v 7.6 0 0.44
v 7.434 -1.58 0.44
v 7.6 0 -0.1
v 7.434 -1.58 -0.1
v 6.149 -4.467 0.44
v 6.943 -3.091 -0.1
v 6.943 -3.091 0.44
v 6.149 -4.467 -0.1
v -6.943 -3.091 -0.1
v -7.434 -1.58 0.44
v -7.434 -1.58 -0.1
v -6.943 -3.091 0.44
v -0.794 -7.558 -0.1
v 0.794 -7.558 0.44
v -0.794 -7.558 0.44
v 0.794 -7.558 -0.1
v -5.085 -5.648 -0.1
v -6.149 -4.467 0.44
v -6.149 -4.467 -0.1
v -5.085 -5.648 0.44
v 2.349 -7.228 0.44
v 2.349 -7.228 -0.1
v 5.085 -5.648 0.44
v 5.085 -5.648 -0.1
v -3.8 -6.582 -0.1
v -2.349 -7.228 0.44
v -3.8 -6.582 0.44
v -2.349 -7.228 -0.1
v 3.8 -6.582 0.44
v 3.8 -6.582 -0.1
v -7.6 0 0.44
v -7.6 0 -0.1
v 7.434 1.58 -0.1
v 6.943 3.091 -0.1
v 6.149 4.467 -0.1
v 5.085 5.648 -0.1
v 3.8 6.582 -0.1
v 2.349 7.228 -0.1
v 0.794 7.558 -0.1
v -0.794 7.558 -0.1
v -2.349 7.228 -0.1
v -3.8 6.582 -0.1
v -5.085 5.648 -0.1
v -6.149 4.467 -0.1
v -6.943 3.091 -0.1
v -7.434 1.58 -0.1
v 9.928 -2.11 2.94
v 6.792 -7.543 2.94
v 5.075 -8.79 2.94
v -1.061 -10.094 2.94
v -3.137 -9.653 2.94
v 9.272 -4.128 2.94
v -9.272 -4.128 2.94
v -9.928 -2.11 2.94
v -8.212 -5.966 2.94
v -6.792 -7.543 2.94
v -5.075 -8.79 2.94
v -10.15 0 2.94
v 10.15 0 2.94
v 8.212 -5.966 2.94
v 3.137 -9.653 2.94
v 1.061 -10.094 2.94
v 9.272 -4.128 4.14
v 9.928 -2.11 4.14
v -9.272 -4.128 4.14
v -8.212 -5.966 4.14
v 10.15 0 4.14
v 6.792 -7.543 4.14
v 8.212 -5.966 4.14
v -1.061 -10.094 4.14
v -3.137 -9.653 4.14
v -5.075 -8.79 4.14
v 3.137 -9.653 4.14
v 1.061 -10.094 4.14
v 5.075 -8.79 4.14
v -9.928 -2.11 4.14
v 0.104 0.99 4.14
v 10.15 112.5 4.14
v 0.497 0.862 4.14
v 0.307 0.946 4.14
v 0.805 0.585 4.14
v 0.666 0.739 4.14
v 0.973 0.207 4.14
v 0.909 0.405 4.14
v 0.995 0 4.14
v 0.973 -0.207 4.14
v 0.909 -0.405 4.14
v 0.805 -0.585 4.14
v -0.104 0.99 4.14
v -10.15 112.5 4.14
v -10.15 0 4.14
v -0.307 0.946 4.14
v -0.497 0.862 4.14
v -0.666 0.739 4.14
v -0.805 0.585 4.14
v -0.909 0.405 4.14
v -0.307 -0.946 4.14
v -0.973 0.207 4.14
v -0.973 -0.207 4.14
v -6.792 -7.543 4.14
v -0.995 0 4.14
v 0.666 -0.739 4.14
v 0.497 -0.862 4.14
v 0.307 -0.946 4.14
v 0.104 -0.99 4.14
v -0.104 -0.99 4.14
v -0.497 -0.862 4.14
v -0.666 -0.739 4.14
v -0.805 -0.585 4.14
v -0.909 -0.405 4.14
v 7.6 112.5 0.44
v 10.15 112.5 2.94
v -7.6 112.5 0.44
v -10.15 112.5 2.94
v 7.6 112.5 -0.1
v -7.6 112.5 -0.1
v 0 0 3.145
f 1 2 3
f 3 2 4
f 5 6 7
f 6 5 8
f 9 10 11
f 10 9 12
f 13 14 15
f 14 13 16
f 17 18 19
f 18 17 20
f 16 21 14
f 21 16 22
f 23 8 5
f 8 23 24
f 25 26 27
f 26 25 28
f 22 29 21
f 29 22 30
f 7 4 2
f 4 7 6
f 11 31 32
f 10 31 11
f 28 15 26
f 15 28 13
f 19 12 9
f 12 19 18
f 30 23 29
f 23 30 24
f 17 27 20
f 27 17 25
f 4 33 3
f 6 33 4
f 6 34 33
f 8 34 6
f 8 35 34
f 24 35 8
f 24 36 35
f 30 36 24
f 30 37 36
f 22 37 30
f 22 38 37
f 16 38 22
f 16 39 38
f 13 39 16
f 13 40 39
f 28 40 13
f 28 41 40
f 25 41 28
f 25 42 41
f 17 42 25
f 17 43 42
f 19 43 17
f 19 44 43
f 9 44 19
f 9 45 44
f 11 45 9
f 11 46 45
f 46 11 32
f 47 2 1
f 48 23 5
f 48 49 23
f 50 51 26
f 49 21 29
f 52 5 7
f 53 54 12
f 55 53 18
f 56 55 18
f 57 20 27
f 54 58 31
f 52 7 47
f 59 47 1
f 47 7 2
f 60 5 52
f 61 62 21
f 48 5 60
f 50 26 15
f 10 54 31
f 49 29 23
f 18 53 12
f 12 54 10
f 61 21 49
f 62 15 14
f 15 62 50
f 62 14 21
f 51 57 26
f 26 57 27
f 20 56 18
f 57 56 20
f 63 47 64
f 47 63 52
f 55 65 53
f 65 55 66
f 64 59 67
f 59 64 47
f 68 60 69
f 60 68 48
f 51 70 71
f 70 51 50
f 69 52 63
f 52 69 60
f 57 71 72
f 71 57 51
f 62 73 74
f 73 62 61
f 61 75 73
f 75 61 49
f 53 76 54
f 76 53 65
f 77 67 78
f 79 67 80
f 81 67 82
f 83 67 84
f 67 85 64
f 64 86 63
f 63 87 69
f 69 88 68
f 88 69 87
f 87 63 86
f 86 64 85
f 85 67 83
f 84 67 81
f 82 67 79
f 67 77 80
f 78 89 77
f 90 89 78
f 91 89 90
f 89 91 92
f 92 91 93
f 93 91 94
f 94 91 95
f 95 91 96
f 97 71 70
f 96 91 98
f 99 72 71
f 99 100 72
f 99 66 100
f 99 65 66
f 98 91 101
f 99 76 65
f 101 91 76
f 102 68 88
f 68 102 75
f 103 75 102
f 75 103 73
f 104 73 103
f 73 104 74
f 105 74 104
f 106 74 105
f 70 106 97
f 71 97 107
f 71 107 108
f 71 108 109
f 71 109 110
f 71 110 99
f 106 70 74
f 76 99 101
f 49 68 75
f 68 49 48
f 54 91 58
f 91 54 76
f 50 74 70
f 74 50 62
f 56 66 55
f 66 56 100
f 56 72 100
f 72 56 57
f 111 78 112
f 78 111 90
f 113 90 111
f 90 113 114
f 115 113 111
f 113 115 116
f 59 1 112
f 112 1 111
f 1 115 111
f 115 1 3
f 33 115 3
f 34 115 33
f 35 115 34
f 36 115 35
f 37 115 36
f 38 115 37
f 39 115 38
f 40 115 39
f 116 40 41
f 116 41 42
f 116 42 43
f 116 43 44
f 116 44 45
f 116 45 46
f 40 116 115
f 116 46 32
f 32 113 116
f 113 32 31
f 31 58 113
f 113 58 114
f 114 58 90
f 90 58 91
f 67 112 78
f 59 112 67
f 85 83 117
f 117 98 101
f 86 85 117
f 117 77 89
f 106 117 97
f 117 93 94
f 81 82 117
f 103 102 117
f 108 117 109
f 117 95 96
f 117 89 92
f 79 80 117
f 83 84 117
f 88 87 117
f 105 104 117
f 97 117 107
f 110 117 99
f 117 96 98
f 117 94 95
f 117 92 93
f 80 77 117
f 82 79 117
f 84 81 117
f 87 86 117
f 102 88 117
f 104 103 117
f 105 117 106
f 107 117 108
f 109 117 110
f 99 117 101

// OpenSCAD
$fs=0.01;

r1 = 7.6;
r2 = 10.15;
t1 = 0.44;
t2 = 2.5;
t3 = 1.2;

l = 112.5;

hr = 1;
hh = 1;

cutout_clear = 0.1; // Add to all cutouts on face.

module connector() {
    translate([0, 0, t1/2])             cylinder(h=t1 + 2*cutout_clear, r = r1, center = true);
    translate([0, 0, t1 + t2/2])        cylinder(h=t2, r1 = r1, r2 = r2, center = true);
    translate([0, 0, t1 + t2 + t3/2])   cylinder(h=t3, r = r2, center = true);
}


module connector_cutout() {
    difference() {
        union() {
            connector();
            rotate([-90, 0, 0]) linear_extrude(l) projection() rotate([90, 0, 0]) connector();
        }

        translate([0, 0, t1+t2+t3-hh/2+.01]) cylinder(h = hh+.01, r1 = 0, r2 = hr+.01, center = true);
    }
}

connector_cutout();

function connector_cutout_height() = t1 + t2 + t3;
function connector_cutout_radius() = r2;
function cell_size() = 25;
